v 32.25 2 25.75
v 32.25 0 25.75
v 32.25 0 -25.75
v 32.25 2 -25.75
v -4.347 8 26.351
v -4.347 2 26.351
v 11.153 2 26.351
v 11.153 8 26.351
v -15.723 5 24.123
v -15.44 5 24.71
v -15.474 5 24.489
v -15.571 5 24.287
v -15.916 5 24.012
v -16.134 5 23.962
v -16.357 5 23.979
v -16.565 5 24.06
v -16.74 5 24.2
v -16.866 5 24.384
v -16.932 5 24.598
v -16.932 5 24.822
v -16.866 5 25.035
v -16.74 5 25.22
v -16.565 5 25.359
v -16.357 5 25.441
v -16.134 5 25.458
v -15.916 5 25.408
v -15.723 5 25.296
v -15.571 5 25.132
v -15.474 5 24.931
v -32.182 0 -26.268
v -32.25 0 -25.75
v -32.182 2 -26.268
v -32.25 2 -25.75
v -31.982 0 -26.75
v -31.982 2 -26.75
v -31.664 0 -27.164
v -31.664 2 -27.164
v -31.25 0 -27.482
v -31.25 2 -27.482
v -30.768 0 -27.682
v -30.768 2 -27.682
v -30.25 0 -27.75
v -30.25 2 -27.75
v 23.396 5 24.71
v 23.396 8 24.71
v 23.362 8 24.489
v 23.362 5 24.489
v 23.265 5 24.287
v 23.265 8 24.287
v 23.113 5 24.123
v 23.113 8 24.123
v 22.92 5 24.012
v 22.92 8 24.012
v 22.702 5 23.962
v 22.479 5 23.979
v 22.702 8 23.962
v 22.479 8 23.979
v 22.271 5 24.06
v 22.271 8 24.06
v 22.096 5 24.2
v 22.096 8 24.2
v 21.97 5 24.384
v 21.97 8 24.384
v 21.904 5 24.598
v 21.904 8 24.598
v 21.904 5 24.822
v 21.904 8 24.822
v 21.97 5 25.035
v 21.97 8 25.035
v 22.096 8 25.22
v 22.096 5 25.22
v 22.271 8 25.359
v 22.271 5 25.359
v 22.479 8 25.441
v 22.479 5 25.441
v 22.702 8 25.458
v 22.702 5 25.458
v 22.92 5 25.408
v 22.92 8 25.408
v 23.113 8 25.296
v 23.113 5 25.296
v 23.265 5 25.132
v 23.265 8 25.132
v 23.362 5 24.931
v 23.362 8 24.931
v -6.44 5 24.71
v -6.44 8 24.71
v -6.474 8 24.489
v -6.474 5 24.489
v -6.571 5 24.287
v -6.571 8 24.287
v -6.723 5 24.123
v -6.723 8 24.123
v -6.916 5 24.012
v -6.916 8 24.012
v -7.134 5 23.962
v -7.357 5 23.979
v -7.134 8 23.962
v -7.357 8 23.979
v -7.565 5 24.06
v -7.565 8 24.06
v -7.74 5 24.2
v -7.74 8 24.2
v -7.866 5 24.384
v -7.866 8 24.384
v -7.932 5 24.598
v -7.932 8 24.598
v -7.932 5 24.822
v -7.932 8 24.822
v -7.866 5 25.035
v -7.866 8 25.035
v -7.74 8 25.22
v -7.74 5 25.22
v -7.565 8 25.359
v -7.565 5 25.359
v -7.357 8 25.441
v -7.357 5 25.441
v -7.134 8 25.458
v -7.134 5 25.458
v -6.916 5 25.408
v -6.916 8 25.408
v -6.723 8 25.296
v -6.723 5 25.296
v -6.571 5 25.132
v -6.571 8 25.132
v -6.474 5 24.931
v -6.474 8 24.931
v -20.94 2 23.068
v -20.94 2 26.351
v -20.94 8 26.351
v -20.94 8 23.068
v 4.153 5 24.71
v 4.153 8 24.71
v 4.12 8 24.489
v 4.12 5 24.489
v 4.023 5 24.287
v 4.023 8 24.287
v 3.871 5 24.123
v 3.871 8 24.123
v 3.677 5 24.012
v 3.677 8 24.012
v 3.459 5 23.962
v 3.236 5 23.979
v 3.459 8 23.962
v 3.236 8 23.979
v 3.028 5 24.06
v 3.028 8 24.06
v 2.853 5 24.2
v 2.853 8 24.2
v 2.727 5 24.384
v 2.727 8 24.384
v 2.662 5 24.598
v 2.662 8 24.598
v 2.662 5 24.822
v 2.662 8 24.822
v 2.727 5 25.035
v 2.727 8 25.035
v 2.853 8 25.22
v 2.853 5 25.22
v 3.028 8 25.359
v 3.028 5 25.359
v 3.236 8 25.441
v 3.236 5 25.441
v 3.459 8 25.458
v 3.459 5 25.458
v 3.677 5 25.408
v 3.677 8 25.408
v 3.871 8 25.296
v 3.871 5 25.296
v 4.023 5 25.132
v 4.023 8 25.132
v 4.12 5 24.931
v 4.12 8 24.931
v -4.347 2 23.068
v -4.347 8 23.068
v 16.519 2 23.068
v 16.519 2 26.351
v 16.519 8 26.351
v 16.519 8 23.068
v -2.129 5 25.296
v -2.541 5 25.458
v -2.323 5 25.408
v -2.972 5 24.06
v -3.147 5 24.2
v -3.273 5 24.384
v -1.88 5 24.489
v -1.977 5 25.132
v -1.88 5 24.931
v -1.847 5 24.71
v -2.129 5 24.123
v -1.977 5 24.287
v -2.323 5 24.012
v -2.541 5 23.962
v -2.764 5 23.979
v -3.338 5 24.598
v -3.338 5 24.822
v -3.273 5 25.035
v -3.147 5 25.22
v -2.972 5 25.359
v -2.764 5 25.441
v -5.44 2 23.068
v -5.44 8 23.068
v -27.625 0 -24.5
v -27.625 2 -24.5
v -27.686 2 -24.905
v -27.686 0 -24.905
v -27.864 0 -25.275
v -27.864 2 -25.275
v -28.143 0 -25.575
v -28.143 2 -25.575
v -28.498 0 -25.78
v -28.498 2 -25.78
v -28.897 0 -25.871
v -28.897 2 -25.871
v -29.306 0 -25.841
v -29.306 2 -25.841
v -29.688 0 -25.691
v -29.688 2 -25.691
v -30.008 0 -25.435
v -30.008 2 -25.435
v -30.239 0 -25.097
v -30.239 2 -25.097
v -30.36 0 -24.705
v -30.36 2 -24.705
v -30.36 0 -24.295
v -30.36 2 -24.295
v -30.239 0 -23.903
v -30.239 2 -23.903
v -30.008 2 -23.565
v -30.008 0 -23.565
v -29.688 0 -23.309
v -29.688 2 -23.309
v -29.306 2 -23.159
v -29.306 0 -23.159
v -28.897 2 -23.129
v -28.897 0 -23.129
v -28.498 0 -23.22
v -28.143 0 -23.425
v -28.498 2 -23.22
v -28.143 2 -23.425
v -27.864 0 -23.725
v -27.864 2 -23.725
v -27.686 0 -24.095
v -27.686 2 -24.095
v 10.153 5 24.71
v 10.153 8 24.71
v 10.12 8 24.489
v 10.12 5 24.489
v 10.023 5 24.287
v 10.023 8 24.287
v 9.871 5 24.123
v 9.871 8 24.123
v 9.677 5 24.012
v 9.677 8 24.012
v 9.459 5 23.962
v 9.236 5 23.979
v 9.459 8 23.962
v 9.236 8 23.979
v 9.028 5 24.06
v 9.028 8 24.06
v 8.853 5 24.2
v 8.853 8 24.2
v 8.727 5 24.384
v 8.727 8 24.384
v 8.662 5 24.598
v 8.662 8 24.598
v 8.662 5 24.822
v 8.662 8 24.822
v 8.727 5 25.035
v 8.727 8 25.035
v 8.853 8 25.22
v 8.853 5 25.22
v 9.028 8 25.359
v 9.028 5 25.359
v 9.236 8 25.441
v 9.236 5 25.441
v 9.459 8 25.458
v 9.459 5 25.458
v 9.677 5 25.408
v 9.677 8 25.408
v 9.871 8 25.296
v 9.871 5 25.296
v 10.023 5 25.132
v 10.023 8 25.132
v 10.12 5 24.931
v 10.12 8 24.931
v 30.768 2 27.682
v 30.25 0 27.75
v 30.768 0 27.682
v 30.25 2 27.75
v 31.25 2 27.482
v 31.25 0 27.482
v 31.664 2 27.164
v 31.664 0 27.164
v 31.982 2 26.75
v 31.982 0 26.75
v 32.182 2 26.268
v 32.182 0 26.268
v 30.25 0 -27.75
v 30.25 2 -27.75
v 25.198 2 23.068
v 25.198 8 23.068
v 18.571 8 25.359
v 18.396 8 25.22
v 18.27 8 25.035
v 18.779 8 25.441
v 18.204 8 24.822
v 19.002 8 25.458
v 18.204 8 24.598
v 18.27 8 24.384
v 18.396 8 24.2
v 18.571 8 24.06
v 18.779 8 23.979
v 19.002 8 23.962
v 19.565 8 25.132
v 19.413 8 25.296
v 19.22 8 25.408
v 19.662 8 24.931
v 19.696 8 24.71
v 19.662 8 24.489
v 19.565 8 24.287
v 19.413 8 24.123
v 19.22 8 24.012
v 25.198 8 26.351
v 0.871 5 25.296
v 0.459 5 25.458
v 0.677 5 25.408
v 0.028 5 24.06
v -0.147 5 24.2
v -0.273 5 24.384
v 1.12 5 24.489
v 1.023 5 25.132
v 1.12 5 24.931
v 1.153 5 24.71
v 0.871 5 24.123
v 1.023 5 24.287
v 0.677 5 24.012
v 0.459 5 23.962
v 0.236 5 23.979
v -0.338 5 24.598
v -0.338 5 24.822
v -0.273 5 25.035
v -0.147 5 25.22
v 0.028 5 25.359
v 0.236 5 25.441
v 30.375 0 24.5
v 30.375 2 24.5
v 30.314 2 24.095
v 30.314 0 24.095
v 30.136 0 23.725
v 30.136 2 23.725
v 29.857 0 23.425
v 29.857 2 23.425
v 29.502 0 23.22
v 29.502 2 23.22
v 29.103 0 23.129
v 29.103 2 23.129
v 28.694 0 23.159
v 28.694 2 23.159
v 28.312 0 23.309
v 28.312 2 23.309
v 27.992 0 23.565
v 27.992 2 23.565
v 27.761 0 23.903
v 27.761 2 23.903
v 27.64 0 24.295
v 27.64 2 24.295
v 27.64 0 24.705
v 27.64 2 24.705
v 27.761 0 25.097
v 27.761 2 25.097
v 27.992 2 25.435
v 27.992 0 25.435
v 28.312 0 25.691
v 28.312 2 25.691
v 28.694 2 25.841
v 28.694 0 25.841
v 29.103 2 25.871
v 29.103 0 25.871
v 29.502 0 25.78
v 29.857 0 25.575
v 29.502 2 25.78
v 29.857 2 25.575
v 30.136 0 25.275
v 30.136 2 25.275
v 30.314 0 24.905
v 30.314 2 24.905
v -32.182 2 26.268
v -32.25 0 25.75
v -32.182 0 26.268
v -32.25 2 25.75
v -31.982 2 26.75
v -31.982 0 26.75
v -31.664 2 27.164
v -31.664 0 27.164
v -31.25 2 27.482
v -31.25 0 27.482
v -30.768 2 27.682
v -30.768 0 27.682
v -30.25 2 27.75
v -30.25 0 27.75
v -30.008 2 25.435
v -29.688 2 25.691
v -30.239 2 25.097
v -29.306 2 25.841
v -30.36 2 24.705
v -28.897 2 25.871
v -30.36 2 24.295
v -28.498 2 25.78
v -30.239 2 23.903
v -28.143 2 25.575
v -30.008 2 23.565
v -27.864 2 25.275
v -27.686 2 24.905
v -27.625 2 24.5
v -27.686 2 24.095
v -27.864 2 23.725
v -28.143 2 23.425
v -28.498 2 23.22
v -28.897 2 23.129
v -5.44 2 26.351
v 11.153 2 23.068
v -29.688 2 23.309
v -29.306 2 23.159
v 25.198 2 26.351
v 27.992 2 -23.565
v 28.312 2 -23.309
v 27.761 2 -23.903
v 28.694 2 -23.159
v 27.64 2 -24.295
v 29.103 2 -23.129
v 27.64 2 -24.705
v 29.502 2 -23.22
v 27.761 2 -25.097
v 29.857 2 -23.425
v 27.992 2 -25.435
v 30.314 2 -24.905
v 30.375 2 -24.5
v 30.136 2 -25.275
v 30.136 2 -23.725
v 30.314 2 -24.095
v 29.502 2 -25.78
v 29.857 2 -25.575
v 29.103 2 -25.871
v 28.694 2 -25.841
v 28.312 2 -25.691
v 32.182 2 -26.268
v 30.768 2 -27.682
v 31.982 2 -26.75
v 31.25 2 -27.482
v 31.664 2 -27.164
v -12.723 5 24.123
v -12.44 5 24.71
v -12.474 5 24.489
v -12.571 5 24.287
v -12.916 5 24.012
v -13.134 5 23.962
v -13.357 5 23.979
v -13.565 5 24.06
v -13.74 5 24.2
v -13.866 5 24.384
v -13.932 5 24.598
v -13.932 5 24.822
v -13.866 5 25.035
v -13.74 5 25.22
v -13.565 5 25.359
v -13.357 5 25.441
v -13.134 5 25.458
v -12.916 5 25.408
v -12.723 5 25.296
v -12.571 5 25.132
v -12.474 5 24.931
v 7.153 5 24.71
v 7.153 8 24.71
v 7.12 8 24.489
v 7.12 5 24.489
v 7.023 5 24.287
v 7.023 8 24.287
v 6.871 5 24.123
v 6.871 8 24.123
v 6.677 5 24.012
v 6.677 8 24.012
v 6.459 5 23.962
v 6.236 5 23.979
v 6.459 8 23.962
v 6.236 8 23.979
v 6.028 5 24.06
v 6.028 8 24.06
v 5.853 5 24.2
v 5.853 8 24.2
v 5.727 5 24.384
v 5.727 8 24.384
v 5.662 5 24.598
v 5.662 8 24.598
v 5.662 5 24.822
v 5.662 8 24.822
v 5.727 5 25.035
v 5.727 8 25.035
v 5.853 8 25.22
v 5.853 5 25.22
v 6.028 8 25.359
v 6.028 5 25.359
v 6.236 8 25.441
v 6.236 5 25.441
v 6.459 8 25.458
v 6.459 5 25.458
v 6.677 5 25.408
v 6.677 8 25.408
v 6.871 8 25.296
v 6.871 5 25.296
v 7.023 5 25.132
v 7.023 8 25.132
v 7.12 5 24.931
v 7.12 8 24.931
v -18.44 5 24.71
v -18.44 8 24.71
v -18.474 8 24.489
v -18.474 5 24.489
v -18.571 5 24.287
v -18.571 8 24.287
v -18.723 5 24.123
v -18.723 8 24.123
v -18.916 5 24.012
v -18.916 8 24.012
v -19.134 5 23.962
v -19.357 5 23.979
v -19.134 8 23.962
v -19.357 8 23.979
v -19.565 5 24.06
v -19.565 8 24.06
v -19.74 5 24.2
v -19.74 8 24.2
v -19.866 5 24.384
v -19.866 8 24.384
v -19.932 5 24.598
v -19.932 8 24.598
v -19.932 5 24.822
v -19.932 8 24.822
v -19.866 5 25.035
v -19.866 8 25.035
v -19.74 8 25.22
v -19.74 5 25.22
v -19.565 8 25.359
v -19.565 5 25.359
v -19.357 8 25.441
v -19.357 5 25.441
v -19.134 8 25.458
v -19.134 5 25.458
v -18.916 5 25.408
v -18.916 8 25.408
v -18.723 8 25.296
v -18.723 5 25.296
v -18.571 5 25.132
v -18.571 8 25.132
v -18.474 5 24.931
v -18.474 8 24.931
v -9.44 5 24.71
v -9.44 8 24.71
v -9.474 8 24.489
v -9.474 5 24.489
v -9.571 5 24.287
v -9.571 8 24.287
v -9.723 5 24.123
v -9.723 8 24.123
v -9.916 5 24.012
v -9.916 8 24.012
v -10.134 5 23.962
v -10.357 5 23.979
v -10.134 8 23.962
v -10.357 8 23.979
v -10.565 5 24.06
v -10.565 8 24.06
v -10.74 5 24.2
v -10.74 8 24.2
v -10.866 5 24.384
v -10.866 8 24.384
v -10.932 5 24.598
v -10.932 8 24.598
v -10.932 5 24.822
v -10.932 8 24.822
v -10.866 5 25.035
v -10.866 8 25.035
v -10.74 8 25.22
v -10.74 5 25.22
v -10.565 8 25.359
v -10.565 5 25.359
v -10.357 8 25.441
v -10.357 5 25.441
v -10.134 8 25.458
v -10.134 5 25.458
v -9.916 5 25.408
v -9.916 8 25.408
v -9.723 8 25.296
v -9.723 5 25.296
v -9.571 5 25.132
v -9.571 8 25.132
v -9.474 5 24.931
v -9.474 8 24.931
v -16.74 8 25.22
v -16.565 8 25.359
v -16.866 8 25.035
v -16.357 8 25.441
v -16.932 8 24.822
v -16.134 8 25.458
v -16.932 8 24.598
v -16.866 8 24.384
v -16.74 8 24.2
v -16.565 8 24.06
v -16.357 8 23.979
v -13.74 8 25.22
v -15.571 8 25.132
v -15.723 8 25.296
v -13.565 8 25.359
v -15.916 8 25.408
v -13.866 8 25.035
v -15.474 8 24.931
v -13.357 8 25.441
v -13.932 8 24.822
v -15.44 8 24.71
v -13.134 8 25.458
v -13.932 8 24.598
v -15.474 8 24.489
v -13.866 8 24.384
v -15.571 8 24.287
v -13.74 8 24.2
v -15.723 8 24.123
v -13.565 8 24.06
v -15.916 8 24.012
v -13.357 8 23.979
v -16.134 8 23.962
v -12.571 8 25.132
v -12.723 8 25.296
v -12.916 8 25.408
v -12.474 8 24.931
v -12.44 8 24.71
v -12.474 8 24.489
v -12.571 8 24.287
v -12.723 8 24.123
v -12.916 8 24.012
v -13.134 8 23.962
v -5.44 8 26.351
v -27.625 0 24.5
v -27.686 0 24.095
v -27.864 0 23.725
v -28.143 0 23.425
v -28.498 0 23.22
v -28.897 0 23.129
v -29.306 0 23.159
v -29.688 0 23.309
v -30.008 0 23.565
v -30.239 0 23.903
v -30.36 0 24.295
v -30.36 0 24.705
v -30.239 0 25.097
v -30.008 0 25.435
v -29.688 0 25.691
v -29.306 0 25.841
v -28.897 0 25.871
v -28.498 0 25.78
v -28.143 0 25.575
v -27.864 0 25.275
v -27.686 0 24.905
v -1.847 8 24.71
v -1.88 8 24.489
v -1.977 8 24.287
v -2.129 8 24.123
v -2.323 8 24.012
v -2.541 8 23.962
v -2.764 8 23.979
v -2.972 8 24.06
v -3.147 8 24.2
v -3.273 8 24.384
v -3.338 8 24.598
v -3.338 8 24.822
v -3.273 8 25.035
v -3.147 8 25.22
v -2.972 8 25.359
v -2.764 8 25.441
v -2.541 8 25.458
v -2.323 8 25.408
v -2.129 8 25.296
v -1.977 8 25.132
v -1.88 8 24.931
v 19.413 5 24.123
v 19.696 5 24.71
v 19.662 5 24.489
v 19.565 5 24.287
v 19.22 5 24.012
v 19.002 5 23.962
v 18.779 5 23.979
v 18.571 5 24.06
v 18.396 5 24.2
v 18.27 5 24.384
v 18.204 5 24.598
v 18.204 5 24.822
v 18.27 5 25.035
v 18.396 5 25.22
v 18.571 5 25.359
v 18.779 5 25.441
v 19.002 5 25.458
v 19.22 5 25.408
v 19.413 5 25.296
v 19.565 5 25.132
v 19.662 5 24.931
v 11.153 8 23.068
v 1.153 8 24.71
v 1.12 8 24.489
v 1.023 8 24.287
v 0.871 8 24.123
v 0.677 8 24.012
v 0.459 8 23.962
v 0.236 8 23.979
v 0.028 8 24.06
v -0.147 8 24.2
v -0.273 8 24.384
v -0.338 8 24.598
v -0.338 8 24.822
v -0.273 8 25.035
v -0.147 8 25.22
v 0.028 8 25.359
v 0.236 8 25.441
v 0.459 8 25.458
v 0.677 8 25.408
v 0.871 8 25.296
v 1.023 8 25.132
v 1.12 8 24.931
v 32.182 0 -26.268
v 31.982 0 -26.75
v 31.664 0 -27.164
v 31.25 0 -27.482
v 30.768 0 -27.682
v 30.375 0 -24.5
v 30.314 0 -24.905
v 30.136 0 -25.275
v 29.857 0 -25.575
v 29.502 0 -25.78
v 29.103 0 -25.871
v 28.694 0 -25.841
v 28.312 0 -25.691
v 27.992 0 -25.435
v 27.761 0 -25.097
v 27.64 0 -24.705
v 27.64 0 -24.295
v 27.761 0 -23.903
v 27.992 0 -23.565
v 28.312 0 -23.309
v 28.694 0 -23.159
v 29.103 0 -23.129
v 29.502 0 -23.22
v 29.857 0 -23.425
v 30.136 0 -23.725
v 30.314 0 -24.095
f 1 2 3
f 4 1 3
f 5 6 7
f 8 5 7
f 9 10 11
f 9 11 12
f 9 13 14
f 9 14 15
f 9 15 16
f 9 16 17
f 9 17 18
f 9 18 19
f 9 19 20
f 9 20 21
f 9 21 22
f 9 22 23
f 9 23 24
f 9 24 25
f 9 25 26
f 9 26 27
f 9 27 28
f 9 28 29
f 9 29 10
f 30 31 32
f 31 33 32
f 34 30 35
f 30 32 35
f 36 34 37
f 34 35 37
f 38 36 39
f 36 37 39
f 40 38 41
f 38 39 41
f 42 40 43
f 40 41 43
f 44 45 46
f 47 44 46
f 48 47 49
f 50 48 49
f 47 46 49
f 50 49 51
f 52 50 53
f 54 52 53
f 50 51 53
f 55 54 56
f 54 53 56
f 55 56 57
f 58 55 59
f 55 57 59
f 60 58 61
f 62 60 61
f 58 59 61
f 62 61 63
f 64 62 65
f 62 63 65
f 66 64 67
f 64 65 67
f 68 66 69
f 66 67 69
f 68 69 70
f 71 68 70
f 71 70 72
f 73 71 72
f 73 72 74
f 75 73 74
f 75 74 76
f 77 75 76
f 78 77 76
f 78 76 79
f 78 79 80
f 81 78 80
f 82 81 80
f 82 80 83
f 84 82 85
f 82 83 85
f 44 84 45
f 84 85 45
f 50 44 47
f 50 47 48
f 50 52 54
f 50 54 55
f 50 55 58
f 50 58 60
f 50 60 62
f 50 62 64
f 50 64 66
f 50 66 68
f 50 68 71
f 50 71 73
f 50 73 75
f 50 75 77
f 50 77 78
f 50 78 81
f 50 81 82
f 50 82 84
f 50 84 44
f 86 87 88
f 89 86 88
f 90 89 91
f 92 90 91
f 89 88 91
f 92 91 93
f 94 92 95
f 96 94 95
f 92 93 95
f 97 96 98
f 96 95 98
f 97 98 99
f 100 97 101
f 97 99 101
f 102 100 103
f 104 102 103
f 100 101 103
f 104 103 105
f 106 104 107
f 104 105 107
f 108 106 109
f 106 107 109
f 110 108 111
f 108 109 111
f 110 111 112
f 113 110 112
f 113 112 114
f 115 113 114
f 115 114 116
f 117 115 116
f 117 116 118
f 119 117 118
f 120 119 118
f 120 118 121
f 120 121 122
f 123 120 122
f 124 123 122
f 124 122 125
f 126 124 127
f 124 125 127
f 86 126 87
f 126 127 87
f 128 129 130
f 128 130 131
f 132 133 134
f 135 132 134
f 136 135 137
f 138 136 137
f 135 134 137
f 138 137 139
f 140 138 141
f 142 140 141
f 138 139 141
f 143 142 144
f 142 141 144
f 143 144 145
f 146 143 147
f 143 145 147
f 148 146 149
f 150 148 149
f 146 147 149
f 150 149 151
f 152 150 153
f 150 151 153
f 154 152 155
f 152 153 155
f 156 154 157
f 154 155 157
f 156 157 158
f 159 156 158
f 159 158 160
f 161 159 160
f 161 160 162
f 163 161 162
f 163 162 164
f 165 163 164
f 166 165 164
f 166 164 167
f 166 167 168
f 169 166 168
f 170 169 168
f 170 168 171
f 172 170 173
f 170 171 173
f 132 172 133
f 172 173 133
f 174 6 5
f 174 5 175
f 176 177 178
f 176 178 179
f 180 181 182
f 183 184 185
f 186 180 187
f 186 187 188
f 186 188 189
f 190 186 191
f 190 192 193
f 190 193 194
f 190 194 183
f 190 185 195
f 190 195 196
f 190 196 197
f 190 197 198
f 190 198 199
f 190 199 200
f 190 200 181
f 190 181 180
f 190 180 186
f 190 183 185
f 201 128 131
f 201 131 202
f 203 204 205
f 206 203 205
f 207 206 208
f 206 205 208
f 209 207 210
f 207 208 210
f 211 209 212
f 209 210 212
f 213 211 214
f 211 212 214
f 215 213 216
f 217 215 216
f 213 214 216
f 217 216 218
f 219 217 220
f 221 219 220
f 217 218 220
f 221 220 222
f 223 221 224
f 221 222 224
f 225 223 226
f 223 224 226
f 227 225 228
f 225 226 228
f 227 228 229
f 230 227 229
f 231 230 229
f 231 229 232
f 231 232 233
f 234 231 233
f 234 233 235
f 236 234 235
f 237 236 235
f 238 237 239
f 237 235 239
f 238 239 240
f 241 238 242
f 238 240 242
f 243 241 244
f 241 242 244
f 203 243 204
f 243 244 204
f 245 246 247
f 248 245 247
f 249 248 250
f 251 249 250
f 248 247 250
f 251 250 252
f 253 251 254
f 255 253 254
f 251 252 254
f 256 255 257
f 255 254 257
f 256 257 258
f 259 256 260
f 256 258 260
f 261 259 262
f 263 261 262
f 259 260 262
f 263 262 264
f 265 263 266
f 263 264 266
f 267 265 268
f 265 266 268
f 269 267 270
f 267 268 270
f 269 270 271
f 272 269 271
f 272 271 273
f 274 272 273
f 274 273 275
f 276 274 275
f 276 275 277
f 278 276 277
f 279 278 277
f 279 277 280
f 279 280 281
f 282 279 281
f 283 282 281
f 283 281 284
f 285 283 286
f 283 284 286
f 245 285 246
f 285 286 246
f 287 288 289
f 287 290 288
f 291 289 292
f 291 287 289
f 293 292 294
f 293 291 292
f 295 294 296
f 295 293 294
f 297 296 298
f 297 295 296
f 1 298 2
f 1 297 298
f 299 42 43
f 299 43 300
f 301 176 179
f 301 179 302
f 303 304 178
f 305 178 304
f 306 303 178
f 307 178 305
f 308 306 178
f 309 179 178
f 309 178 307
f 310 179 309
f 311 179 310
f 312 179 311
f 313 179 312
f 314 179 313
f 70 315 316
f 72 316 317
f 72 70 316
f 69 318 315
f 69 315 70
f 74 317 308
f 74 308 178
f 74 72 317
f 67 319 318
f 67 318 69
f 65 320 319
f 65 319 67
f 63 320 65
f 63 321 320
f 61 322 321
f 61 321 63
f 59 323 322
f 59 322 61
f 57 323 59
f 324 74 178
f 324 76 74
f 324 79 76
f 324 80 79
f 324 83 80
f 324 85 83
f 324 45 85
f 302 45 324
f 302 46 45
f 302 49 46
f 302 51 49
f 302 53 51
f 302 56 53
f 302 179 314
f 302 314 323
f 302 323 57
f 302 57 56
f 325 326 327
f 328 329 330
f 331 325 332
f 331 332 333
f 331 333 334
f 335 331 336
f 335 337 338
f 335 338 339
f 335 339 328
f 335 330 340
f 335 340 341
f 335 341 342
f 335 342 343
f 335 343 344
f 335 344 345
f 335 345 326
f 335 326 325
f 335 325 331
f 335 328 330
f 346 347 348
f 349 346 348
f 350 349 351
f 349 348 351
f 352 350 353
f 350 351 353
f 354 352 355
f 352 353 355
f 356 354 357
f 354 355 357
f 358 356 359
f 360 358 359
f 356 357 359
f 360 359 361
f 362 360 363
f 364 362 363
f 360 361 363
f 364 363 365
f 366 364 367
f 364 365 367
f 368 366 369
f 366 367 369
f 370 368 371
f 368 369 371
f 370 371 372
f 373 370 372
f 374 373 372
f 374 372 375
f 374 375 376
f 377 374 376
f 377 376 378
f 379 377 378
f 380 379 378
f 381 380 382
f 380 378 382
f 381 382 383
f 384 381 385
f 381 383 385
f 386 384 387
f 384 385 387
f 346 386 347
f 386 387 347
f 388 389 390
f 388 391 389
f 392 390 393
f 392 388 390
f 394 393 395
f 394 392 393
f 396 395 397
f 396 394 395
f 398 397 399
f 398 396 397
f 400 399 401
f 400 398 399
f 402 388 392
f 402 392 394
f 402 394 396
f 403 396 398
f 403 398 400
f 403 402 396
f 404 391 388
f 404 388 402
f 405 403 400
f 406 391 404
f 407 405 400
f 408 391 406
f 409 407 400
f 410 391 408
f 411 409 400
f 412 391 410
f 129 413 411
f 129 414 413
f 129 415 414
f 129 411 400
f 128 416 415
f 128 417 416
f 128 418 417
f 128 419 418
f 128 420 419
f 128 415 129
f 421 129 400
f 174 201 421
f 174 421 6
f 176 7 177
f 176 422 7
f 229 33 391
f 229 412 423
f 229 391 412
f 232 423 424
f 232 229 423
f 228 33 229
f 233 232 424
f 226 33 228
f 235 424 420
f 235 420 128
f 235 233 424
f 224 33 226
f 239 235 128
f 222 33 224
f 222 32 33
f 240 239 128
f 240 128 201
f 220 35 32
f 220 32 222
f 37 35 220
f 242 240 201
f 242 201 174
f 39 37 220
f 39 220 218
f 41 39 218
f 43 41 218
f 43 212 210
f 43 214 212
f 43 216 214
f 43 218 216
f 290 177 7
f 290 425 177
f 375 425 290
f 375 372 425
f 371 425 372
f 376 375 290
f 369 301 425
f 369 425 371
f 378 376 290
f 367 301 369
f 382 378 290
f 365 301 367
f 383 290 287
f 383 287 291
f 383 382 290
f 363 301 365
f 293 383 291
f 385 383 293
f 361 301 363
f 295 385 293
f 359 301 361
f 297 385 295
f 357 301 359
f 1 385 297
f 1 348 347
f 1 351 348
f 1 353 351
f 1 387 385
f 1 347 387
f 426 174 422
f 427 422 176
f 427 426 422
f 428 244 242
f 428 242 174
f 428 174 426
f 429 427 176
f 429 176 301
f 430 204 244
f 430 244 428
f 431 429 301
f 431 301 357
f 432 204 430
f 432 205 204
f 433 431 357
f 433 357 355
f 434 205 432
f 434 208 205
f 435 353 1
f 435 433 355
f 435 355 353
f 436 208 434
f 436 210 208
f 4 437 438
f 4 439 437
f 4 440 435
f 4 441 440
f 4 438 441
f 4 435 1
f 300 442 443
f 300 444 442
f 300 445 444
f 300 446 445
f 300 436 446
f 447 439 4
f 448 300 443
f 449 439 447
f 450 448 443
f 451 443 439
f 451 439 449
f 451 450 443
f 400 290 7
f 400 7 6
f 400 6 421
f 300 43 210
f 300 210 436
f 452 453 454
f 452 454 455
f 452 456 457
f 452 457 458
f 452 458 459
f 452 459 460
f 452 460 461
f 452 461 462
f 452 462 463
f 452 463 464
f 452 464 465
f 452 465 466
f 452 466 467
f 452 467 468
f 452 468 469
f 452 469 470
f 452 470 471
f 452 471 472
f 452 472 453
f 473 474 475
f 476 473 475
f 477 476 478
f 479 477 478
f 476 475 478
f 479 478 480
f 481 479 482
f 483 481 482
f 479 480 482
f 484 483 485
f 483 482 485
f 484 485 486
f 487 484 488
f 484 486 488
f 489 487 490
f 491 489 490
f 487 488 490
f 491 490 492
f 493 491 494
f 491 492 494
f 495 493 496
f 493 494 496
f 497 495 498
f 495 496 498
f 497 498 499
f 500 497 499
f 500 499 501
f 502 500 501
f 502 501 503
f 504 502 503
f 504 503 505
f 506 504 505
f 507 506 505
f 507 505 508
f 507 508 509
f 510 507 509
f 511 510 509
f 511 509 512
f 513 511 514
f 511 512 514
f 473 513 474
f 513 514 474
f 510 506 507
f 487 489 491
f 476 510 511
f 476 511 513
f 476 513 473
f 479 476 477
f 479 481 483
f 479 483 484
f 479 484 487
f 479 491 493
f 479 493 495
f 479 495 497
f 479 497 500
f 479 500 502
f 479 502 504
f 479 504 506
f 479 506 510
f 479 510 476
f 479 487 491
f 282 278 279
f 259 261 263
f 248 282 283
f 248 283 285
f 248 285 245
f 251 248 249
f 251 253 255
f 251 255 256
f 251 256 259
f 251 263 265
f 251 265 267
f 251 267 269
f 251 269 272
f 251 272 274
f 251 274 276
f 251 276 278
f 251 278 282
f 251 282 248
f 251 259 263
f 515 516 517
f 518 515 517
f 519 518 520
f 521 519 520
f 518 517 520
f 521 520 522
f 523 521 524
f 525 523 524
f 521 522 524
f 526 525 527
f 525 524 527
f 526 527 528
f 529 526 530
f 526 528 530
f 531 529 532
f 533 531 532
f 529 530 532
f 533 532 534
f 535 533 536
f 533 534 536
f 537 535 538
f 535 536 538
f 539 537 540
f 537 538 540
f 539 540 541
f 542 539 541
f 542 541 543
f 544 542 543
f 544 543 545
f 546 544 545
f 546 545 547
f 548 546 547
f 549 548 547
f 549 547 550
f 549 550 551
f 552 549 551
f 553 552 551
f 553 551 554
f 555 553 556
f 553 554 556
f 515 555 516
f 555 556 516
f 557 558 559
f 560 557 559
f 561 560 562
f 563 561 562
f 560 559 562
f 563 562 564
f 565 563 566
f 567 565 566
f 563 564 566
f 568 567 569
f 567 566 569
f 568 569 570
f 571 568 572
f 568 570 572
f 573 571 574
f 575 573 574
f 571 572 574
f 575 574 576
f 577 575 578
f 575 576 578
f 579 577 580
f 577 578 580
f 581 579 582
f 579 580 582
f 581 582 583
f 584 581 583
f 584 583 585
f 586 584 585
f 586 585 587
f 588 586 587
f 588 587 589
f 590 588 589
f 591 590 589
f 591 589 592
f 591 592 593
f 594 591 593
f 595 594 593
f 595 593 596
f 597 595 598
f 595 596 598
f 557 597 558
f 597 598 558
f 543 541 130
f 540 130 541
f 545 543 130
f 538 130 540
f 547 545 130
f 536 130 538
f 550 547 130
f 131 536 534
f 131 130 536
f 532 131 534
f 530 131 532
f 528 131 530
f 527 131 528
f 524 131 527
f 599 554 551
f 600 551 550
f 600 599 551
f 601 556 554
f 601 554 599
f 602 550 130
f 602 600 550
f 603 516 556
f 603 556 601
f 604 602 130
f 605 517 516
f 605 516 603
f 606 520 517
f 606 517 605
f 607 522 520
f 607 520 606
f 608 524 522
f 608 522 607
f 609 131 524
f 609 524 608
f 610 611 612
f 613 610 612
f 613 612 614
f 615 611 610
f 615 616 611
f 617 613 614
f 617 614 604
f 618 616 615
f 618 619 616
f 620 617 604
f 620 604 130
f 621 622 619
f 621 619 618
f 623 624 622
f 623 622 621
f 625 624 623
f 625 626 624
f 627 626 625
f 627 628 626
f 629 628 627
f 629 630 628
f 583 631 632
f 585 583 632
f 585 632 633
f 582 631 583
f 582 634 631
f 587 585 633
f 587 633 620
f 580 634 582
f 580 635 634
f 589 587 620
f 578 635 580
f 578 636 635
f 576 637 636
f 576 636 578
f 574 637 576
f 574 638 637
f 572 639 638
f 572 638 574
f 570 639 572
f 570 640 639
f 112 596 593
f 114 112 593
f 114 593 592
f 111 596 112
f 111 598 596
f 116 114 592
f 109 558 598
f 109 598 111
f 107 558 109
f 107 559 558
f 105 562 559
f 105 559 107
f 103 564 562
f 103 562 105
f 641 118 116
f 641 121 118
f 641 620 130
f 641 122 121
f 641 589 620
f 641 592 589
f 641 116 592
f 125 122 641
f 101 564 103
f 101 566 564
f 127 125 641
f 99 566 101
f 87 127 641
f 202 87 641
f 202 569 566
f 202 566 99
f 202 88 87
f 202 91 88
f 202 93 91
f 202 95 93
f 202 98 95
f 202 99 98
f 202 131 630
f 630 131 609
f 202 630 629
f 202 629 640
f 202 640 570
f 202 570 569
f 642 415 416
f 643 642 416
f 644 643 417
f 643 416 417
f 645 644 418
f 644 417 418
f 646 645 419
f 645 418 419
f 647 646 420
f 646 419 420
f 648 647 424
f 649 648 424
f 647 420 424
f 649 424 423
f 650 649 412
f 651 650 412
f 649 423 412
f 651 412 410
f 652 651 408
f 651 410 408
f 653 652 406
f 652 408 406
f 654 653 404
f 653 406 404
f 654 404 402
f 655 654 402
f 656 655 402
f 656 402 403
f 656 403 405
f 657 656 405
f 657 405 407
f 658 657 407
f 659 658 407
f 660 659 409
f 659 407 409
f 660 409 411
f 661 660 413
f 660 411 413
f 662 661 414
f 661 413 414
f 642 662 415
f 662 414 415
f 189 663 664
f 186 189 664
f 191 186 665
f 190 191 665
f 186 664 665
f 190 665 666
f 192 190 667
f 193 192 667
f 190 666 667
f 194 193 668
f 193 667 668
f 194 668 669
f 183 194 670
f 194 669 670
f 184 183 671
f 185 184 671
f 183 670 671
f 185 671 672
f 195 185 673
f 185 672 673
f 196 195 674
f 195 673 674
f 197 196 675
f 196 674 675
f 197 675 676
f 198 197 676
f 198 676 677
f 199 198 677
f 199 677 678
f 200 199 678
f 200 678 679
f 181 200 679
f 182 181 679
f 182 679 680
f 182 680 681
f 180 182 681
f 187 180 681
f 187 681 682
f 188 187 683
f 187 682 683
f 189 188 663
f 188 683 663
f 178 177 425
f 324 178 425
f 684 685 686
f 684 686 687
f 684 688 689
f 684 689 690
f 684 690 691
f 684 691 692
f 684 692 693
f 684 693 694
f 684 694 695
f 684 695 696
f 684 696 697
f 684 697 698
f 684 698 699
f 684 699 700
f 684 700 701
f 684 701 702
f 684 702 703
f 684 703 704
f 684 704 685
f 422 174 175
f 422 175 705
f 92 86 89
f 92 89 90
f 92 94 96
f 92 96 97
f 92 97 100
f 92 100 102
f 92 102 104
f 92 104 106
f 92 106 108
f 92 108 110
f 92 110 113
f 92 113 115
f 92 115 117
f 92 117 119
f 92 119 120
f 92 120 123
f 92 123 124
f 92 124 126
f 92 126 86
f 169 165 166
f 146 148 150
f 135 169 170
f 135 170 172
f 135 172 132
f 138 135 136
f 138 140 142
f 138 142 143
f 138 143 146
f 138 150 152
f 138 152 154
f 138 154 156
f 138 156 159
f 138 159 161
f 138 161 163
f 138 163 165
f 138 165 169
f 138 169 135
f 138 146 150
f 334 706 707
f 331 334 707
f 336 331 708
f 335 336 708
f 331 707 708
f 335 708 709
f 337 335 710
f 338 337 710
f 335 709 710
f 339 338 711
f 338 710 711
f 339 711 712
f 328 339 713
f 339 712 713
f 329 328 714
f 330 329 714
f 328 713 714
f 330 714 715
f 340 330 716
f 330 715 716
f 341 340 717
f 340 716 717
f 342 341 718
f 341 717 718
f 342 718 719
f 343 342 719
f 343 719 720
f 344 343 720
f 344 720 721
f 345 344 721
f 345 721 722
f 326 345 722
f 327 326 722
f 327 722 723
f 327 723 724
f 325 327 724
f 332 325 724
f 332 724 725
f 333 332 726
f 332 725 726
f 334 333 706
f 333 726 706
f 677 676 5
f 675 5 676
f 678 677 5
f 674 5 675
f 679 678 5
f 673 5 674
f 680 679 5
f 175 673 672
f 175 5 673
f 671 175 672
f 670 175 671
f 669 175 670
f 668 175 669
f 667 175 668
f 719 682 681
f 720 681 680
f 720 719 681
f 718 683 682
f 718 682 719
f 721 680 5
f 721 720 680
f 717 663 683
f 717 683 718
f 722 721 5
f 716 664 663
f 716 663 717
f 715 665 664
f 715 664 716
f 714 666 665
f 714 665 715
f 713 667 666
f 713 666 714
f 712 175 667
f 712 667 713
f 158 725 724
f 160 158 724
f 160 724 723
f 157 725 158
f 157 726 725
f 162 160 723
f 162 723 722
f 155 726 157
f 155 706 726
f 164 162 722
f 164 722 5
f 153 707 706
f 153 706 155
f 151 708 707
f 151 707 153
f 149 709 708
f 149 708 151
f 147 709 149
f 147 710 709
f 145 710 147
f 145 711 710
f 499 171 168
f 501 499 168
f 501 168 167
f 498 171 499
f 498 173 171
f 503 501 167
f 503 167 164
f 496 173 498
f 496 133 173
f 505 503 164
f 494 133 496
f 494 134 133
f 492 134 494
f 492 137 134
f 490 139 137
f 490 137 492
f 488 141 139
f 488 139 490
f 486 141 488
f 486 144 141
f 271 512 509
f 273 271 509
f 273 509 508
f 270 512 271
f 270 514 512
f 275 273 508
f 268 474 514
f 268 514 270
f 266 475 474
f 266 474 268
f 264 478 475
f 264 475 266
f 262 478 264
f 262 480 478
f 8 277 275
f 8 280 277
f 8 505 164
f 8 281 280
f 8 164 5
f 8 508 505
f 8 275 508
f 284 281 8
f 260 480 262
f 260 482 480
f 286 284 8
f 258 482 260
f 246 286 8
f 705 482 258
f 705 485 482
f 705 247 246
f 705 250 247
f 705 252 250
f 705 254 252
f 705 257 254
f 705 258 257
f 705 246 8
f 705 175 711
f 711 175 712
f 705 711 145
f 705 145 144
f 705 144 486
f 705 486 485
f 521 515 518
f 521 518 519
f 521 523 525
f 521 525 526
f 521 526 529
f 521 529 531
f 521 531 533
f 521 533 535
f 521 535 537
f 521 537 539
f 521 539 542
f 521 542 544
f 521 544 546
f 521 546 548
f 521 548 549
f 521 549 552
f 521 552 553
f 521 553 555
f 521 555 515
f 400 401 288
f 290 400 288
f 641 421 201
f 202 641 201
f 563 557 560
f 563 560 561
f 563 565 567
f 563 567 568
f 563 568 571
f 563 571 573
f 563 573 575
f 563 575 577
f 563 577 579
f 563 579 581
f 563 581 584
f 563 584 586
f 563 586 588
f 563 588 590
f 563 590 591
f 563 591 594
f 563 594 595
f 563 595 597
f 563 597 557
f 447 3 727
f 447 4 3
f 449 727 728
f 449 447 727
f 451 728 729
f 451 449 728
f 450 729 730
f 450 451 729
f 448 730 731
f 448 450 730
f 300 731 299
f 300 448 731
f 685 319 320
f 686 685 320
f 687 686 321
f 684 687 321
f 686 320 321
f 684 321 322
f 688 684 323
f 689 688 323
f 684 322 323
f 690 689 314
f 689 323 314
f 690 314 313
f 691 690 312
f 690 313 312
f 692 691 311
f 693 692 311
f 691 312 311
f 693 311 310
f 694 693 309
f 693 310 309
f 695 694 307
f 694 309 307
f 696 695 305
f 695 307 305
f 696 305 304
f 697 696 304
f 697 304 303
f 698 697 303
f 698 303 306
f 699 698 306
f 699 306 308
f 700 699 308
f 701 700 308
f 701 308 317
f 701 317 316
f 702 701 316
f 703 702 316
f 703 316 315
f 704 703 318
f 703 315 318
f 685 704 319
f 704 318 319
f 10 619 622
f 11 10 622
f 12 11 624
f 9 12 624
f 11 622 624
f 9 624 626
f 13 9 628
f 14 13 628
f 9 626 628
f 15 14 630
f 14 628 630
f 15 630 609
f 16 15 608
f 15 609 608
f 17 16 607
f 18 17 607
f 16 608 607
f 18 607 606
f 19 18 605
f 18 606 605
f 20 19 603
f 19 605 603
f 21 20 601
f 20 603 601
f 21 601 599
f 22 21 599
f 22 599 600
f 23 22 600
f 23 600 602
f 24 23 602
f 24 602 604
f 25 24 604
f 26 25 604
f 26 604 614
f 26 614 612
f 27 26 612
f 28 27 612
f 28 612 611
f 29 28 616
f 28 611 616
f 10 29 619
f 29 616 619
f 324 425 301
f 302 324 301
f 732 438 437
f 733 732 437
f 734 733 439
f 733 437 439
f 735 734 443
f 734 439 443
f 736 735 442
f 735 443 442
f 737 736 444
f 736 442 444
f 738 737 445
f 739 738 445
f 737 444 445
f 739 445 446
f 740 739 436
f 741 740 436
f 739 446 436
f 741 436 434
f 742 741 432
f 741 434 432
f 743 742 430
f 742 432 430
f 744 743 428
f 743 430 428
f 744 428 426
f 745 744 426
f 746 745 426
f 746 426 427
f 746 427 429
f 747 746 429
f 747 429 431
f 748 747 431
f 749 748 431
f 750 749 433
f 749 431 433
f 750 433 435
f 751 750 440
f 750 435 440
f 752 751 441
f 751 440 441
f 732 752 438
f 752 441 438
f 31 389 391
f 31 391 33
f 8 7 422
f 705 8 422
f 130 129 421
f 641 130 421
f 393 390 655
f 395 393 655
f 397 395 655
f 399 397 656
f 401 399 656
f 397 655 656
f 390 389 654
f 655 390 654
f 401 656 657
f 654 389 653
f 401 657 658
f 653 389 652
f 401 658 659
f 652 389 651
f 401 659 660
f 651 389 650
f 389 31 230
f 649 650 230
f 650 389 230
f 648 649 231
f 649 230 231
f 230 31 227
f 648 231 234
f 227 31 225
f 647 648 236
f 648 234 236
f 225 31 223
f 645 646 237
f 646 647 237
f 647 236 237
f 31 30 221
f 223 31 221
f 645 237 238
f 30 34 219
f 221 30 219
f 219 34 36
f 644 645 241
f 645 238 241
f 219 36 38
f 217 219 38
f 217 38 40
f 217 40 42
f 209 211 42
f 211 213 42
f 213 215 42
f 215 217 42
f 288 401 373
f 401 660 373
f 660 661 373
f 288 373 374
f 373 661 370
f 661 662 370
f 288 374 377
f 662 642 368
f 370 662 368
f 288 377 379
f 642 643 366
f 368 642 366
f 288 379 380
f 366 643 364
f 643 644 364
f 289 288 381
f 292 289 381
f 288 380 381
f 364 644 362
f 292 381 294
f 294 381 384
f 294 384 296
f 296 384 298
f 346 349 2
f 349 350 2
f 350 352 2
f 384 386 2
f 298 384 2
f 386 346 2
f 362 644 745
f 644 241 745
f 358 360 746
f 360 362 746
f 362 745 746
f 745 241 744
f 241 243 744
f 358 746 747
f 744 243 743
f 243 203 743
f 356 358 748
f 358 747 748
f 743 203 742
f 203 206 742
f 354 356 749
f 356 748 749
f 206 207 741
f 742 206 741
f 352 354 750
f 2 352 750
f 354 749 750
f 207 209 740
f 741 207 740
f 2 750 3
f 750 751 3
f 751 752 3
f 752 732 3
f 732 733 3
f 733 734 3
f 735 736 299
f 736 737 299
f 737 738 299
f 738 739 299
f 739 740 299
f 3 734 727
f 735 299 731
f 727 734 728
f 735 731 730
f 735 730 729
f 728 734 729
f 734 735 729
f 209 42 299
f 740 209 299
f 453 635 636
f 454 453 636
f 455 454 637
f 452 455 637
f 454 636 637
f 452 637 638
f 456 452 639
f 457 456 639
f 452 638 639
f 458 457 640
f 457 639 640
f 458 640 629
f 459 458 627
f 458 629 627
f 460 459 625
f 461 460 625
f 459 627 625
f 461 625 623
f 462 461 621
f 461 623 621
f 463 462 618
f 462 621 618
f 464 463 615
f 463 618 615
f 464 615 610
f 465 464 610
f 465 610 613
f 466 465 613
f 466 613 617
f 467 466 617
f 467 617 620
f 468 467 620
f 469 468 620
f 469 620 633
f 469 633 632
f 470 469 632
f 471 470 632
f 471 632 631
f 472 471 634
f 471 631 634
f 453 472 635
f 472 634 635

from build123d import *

# Parameters (mm, degrees)
SKETCH1_W           = 64.5
SKETCH1_H           = 55.5
BOSS_EXTRUDE1_DEPTH = 2
FILLET1_R           = 2
SKETCH2_R           = 1.375
CUT_EXTRUDE1_DEPTH  = 2
SKETCH3_W           = 15.5
SKETCH3_H           = 3.282744178
SKETCH3_W_2         = 8.679035978
BOSS_EXTRUDE2_DEPTH = 6
SKETCH4_R           = 0.75
CUT_EXTRUDE2_DEPTH  = 3
LPATTERN1_COUNT     = 3
LPATTERN1_PITCH     = 3
LPATTERN1_COL_COUNT = 3
LPATTERN1_COL_PITCH = 3
SKETCH5_R           = 0.75
CUT_EXTRUDE3_DEPTH  = 3
LPATTERN2_COUNT     = 3
LPATTERN2_PITCH     = 3
LPATTERN2_COL_COUNT = 3
LPATTERN2_COL_PITCH = 3
SKETCH6_R           = 0.75
CUT_EXTRUDE4_DEPTH  = 3
LPATTERN3_COUNT     = 2
LPATTERN3_PITCH     = 3.7


with BuildPart() as part:
    # Sketch1 → Boss-Extrude1 (new body)
    with BuildSketch(Plane(origin=(0, 0, 0), x_dir=(1, 0, 0), z_dir=(0, 1, 0))):
        Rectangle(SKETCH1_W, SKETCH1_H)
    extrude(amount=BOSS_EXTRUDE1_DEPTH)

    # Fillet1
    fillet1_edges = [part.edges().sort_by_distance(p)[0] for p in [
        (32.25, 1, 27.75),
        (-32.25, 1, 27.75),
        (-32.25, 1, -27.75),
        (32.25, 1, -27.75),
    ]]
    fillet(fillet1_edges, radius=FILLET1_R)

    # Sketch2 → Cut-Extrude1 (cut)
    with BuildSketch(Plane(origin=(0, 2, 0), x_dir=(1, 0, 0), z_dir=(0, 1, 0))):
        with Locations((-29, 24.5)):
            Circle(SKETCH2_R)
        with Locations((29, 24.5)):
            Circle(SKETCH2_R)
        with Locations((29, -24.5)):
            Circle(SKETCH2_R)
        with Locations((-29, -24.5)):
            Circle(SKETCH2_R)
    extrude(amount=-CUT_EXTRUDE1_DEPTH, mode=Mode.SUBTRACT)

    # Sketch3 → Boss-Extrude2 (add)
    with BuildSketch(Plane(origin=(0, 2, 0), x_dir=(1, 0, 0), z_dir=(0, 1, 0))):
        with Locations((-13.190464122, -24.709786803)):
            Rectangle(SKETCH3_W, SKETCH3_H)
        with Locations((3.403133163, -24.709786803)):
            Rectangle(SKETCH3_W, SKETCH3_H)
        with Locations((20.858312779, -24.709786803)):
            Rectangle(SKETCH3_W_2, SKETCH3_H)
    extrude(amount=BOSS_EXTRUDE2_DEPTH)

    # Sketch4 → Cut-Extrude2 (cut)
    with BuildSketch(Plane(origin=(0, 8, 0), x_dir=(1, 0, 0), z_dir=(0, 1, 0))):
        with Locations((-13.190464122, -24.709786803)):
            Circle(SKETCH4_R)
    cut_extrude2 = extrude(amount=-CUT_EXTRUDE2_DEPTH, mode=Mode.SUBTRACT)

    # LPattern1: Cut-Extrude2 ×3
    with Locations(*[(-i * LPATTERN1_PITCH, 0, 0) for i in range(1, LPATTERN1_COUNT)]):
        add(cut_extrude2, mode=Mode.SUBTRACT)

    # LPattern1 col: Cut-Extrude2 ×3
    with Locations(*[(i * LPATTERN1_COL_PITCH, 0, 0) for i in range(1, LPATTERN1_COL_COUNT)]):
        add(cut_extrude2, mode=Mode.SUBTRACT)

    # Sketch5 → Cut-Extrude3 (cut)
    with BuildSketch(Plane(origin=(0, 8, 0), x_dir=(1, 0, 0), z_dir=(0, 1, 0))):
        with Locations((3.403133163, -24.709786803)):
            Circle(SKETCH5_R)
    cut_extrude3 = extrude(amount=-CUT_EXTRUDE3_DEPTH, mode=Mode.SUBTRACT)

    # LPattern2: Cut-Extrude3 ×3
    with Locations(*[(-i * LPATTERN2_PITCH, 0, 0) for i in range(1, LPATTERN2_COUNT)]):
        add(cut_extrude3, mode=Mode.SUBTRACT)

    # LPattern2 col: Cut-Extrude3 ×3
    with Locations(*[(i * LPATTERN2_COL_PITCH, 0, 0) for i in range(1, LPATTERN2_COL_COUNT)]):
        add(cut_extrude3, mode=Mode.SUBTRACT)

    # Sketch6 → Cut-Extrude4 (cut)
    with BuildSketch(Plane(origin=(0, 8, 0), x_dir=(1, 0, 0), z_dir=(0, 1, 0))):
        with Locations((18.945697915, -24.709786803)):
            Circle(SKETCH6_R)
    cut_extrude4 = extrude(amount=-CUT_EXTRUDE4_DEPTH, mode=Mode.SUBTRACT)

    # LPattern3: Cut-Extrude4 ×2
    with Locations(*[(i * LPATTERN3_PITCH, 0, 0) for i in range(1, LPATTERN3_COUNT)]):
        add(cut_extrude4, mode=Mode.SUBTRACT)


solid = part.part
